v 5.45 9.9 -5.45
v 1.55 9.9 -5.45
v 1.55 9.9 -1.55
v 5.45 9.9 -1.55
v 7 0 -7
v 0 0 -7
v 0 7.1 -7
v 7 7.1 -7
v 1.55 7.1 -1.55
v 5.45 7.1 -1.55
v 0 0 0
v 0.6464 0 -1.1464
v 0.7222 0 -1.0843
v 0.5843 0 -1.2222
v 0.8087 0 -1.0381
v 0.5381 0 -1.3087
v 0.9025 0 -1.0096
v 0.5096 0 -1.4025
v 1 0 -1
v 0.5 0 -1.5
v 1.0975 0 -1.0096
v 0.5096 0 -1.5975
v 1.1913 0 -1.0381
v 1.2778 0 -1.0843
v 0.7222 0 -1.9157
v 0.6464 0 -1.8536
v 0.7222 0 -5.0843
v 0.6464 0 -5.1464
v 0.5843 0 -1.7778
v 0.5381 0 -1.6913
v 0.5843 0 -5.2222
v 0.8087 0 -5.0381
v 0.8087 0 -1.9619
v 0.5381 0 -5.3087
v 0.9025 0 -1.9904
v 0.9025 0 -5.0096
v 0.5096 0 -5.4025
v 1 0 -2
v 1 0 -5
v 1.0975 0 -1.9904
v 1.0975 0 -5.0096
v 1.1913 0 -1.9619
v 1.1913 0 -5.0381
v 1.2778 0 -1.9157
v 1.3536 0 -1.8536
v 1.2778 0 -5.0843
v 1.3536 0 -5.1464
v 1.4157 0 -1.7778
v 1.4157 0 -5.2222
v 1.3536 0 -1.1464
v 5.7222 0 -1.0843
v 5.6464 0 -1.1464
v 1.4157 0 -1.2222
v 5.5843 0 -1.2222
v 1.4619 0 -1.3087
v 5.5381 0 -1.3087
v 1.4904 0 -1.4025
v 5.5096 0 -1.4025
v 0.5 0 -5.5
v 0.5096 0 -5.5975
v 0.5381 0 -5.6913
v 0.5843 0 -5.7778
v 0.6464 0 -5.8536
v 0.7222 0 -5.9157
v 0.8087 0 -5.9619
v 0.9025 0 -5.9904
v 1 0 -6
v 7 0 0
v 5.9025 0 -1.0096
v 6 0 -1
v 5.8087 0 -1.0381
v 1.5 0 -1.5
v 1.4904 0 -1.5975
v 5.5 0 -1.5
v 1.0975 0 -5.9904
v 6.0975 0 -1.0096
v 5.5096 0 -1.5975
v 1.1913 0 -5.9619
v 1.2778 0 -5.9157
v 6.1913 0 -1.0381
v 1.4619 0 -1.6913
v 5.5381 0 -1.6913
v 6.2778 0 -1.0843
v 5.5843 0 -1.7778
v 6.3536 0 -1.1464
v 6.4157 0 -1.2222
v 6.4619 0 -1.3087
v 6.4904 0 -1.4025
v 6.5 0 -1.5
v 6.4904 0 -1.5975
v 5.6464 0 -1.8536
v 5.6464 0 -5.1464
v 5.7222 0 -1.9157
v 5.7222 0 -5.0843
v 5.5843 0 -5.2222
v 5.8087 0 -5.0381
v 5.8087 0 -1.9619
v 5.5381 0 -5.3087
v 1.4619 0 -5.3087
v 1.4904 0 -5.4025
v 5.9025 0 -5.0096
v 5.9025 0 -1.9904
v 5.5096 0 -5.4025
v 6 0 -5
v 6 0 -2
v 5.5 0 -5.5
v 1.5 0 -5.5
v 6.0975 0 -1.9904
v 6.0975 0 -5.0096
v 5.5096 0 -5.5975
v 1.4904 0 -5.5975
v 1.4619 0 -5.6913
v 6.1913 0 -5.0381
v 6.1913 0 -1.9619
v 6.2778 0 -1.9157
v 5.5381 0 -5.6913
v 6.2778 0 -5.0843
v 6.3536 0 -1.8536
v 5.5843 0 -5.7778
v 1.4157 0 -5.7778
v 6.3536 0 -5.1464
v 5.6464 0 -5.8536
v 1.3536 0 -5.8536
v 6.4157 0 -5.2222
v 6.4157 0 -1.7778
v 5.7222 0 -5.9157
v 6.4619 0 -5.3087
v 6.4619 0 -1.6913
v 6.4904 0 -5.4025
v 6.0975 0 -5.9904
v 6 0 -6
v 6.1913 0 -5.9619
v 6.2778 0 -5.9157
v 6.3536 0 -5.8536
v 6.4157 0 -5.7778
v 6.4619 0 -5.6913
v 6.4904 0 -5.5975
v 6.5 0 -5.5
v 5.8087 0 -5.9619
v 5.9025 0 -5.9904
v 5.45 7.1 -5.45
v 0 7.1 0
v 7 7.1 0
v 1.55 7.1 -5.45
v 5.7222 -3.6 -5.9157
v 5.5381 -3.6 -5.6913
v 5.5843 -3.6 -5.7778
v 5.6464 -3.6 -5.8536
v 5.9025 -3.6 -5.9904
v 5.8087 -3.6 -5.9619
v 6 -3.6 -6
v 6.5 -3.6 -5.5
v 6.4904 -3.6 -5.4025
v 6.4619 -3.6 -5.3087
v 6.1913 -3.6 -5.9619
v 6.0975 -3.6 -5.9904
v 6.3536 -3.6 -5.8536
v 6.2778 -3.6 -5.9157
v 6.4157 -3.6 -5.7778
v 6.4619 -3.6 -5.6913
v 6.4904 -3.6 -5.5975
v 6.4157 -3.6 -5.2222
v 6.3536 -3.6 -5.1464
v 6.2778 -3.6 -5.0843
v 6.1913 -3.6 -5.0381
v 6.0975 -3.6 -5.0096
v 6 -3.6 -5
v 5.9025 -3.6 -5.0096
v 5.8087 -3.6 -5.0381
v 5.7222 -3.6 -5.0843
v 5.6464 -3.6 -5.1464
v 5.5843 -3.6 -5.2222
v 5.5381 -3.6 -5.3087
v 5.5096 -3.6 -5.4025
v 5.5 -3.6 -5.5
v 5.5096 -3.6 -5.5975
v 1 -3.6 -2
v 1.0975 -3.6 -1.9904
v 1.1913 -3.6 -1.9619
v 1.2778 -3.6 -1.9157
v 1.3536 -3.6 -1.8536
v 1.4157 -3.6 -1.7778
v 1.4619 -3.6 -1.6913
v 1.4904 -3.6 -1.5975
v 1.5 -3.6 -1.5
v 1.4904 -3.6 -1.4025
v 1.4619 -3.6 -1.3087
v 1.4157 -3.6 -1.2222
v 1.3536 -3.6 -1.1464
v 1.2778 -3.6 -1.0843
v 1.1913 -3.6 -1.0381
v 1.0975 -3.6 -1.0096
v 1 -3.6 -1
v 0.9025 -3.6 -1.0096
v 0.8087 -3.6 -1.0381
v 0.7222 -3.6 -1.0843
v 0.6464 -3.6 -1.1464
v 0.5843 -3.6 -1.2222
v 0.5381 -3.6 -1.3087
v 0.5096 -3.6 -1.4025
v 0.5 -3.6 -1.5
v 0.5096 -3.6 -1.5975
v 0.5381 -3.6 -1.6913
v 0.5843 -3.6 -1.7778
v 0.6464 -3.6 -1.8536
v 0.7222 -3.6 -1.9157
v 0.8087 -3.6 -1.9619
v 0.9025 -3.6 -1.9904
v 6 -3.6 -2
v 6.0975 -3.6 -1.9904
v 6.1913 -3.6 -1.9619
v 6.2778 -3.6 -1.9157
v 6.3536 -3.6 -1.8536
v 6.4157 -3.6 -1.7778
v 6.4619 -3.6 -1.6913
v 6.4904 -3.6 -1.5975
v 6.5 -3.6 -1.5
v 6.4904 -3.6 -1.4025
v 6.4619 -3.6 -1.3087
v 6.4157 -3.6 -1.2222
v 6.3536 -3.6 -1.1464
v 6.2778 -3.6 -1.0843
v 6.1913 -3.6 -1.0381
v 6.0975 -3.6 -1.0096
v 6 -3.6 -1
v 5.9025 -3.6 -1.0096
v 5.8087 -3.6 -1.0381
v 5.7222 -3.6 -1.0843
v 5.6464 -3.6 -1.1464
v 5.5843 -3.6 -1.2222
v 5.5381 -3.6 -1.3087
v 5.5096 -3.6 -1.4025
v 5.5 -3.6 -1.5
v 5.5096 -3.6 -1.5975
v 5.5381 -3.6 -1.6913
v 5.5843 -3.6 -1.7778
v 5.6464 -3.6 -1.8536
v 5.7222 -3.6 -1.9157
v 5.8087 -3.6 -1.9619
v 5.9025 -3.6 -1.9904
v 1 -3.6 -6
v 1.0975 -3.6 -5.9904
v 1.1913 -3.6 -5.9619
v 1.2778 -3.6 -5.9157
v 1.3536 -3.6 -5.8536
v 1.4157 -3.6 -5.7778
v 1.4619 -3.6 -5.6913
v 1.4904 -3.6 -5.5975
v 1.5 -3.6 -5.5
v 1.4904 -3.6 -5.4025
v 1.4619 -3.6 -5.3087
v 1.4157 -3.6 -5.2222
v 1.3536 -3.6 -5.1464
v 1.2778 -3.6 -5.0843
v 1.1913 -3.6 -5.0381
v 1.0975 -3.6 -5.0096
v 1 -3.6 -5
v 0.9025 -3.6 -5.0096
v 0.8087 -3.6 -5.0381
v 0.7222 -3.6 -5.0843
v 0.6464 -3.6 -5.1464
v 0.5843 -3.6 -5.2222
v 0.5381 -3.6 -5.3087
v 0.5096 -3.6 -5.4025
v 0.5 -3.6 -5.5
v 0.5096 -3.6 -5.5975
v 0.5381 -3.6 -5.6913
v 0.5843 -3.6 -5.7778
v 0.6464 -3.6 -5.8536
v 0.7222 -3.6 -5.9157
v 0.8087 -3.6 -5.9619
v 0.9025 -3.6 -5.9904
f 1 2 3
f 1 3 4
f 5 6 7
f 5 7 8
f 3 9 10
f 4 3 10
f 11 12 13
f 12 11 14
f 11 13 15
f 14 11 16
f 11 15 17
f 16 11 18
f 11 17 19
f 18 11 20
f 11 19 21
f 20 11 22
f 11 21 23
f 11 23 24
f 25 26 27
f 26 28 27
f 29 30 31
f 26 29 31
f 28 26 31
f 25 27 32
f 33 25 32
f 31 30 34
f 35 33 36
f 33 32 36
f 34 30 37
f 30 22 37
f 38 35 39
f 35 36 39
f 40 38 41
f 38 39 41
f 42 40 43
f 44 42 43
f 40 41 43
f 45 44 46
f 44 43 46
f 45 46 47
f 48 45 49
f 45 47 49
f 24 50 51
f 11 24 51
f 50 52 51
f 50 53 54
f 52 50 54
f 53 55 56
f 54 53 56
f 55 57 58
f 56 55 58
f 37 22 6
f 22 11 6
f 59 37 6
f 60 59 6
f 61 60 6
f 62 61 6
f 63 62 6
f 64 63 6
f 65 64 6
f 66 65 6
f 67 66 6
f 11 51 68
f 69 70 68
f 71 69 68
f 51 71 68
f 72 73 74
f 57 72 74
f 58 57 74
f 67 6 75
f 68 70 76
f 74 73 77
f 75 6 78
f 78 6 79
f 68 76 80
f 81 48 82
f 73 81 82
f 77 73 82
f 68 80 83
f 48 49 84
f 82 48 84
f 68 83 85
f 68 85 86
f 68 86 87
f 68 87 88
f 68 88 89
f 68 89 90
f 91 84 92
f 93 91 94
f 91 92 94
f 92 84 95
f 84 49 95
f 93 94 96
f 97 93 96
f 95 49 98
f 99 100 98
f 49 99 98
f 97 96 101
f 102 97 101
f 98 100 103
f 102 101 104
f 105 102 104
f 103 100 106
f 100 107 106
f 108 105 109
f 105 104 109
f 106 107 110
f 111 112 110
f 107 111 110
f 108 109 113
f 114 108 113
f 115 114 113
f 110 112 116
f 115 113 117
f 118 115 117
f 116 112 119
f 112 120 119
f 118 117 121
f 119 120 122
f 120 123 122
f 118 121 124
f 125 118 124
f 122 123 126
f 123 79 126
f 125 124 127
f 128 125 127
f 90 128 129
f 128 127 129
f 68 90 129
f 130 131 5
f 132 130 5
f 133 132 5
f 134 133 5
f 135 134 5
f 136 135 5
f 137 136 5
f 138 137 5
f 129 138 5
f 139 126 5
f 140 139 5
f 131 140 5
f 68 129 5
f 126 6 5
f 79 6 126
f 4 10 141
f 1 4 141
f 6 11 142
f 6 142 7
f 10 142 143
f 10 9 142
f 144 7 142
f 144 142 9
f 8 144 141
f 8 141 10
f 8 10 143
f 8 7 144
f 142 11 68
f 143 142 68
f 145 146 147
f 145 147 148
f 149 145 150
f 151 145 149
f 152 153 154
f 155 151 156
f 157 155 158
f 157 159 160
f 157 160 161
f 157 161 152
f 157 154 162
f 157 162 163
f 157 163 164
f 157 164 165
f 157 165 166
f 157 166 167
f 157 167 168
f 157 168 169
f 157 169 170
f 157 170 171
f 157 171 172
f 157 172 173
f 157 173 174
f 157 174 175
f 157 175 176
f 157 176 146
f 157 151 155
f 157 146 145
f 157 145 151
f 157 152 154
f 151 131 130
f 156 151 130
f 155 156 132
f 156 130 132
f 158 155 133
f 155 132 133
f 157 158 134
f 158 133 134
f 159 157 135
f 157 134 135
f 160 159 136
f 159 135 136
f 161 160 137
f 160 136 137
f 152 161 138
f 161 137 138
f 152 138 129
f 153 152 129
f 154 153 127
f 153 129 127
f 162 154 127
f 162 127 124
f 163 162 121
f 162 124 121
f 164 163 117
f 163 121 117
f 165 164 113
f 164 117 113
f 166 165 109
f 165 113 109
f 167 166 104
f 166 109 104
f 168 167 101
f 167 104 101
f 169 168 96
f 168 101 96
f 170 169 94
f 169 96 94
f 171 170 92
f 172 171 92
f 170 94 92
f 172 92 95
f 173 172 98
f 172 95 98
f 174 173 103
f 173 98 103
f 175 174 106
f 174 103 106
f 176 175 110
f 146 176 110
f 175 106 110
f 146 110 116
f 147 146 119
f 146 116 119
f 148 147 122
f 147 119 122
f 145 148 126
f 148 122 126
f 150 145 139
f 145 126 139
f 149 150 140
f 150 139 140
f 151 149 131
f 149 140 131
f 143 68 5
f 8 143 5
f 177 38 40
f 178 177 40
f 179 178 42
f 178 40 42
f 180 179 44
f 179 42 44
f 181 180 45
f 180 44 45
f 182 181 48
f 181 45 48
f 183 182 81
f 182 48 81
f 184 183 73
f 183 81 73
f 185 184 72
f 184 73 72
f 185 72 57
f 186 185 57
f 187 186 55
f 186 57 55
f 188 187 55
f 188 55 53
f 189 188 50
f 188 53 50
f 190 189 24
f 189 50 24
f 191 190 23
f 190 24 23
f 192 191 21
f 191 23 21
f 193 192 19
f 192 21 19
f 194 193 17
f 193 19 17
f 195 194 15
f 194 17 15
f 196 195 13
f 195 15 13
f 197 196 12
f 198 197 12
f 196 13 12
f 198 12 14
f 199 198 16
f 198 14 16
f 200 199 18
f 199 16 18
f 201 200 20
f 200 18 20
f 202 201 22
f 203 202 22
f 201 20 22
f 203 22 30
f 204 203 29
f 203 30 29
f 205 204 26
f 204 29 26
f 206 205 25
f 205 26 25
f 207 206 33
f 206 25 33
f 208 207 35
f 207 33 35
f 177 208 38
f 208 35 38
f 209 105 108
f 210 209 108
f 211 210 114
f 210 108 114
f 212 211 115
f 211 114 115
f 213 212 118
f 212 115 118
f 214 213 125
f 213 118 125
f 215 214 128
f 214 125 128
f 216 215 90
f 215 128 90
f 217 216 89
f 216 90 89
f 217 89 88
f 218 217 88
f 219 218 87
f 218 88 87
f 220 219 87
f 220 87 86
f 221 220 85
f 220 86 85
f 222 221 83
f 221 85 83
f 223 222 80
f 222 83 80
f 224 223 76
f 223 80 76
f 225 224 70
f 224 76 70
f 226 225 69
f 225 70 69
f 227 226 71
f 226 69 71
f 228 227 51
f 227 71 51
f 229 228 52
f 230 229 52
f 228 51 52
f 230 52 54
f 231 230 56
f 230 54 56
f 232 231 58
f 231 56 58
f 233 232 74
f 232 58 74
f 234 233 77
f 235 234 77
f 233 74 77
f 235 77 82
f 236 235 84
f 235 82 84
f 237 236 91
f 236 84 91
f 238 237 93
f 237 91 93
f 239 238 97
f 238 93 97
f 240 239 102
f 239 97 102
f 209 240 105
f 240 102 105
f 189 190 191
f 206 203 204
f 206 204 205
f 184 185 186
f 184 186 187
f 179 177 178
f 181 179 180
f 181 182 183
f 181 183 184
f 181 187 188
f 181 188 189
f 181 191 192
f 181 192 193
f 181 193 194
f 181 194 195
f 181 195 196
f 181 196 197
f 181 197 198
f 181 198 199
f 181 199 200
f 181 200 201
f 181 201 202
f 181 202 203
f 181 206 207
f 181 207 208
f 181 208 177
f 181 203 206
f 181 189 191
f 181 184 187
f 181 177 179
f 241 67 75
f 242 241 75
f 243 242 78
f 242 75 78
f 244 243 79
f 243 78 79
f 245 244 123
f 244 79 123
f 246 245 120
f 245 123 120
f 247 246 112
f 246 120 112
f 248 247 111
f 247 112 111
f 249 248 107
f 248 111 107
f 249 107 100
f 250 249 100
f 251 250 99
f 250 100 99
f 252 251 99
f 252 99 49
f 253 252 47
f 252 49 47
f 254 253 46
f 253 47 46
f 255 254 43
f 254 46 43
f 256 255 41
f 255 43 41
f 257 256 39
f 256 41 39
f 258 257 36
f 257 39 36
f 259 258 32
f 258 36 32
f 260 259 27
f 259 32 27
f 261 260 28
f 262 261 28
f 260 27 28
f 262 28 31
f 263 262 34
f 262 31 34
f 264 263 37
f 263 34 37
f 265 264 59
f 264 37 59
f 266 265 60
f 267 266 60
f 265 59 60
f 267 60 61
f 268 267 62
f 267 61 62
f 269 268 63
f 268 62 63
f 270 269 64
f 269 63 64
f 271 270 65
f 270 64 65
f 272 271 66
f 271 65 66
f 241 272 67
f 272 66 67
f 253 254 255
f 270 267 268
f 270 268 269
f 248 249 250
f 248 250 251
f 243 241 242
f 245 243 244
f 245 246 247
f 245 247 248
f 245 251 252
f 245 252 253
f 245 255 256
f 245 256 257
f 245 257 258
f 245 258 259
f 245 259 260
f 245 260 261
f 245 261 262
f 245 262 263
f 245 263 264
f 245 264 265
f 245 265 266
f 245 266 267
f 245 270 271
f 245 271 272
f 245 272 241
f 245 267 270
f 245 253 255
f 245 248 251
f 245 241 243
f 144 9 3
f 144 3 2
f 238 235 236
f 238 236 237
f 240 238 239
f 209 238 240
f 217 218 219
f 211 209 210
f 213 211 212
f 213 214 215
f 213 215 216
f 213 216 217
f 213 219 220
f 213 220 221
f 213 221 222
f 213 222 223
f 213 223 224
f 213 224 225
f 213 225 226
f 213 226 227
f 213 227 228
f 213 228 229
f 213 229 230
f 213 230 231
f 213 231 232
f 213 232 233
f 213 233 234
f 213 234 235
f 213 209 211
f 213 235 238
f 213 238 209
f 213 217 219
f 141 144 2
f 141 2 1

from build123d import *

# Parameters (mm, degrees)
SKETCH_1_W      = 7
SKETCH_1_H      = 7
EXTRUDE_1_DEPTH = 7.1
SKETCH_2_W      = 3.9
SKETCH_2_H      = 3.9
EXTRUDE_2_DEPTH = 2.8
SKETCH_3_R      = 0.5
EXTRUDE_3_DEPTH = 3.6


with BuildPart() as part:
    # 草图1 → 凸台-拉伸1 (new body)
    with BuildSketch(Plane(origin=(0, 0, 0), x_dir=(1, 0, 0), z_dir=(0, 1, 0))):
        with Locations((3.5, 3.5)):
            Rectangle(SKETCH_1_W, SKETCH_1_H)
    extrude(amount=EXTRUDE_1_DEPTH)

    # 草图2 → 凸台-拉伸2 (add)
    with BuildSketch(Plane(origin=(0, 7.1, 0), x_dir=(1, 0, 0), z_dir=(0, 1, 0))):
        with Locations((3.5, 3.5)):
            Rectangle(SKETCH_2_W, SKETCH_2_H)
    extrude(amount=EXTRUDE_2_DEPTH)

    # 草图3 → 凸台-拉伸3 (add)
    with BuildSketch(Plane.XZ):
        with Locations(Location((1, -1.5, 0), (0, 0, 270))):
            Circle(SKETCH_3_R)
        with Locations(Location((6, -1.5, 0), (0, 0, 270))):
            Circle(SKETCH_3_R)
        with Locations(Location((6, -5.5, 0), (0, 0, 270))):
            Circle(SKETCH_3_R)
        with Locations(Location((1, -5.5, 0), (0, 0, 270))):
            Circle(SKETCH_3_R)
    extrude(amount=EXTRUDE_3_DEPTH)


solid = part.part
